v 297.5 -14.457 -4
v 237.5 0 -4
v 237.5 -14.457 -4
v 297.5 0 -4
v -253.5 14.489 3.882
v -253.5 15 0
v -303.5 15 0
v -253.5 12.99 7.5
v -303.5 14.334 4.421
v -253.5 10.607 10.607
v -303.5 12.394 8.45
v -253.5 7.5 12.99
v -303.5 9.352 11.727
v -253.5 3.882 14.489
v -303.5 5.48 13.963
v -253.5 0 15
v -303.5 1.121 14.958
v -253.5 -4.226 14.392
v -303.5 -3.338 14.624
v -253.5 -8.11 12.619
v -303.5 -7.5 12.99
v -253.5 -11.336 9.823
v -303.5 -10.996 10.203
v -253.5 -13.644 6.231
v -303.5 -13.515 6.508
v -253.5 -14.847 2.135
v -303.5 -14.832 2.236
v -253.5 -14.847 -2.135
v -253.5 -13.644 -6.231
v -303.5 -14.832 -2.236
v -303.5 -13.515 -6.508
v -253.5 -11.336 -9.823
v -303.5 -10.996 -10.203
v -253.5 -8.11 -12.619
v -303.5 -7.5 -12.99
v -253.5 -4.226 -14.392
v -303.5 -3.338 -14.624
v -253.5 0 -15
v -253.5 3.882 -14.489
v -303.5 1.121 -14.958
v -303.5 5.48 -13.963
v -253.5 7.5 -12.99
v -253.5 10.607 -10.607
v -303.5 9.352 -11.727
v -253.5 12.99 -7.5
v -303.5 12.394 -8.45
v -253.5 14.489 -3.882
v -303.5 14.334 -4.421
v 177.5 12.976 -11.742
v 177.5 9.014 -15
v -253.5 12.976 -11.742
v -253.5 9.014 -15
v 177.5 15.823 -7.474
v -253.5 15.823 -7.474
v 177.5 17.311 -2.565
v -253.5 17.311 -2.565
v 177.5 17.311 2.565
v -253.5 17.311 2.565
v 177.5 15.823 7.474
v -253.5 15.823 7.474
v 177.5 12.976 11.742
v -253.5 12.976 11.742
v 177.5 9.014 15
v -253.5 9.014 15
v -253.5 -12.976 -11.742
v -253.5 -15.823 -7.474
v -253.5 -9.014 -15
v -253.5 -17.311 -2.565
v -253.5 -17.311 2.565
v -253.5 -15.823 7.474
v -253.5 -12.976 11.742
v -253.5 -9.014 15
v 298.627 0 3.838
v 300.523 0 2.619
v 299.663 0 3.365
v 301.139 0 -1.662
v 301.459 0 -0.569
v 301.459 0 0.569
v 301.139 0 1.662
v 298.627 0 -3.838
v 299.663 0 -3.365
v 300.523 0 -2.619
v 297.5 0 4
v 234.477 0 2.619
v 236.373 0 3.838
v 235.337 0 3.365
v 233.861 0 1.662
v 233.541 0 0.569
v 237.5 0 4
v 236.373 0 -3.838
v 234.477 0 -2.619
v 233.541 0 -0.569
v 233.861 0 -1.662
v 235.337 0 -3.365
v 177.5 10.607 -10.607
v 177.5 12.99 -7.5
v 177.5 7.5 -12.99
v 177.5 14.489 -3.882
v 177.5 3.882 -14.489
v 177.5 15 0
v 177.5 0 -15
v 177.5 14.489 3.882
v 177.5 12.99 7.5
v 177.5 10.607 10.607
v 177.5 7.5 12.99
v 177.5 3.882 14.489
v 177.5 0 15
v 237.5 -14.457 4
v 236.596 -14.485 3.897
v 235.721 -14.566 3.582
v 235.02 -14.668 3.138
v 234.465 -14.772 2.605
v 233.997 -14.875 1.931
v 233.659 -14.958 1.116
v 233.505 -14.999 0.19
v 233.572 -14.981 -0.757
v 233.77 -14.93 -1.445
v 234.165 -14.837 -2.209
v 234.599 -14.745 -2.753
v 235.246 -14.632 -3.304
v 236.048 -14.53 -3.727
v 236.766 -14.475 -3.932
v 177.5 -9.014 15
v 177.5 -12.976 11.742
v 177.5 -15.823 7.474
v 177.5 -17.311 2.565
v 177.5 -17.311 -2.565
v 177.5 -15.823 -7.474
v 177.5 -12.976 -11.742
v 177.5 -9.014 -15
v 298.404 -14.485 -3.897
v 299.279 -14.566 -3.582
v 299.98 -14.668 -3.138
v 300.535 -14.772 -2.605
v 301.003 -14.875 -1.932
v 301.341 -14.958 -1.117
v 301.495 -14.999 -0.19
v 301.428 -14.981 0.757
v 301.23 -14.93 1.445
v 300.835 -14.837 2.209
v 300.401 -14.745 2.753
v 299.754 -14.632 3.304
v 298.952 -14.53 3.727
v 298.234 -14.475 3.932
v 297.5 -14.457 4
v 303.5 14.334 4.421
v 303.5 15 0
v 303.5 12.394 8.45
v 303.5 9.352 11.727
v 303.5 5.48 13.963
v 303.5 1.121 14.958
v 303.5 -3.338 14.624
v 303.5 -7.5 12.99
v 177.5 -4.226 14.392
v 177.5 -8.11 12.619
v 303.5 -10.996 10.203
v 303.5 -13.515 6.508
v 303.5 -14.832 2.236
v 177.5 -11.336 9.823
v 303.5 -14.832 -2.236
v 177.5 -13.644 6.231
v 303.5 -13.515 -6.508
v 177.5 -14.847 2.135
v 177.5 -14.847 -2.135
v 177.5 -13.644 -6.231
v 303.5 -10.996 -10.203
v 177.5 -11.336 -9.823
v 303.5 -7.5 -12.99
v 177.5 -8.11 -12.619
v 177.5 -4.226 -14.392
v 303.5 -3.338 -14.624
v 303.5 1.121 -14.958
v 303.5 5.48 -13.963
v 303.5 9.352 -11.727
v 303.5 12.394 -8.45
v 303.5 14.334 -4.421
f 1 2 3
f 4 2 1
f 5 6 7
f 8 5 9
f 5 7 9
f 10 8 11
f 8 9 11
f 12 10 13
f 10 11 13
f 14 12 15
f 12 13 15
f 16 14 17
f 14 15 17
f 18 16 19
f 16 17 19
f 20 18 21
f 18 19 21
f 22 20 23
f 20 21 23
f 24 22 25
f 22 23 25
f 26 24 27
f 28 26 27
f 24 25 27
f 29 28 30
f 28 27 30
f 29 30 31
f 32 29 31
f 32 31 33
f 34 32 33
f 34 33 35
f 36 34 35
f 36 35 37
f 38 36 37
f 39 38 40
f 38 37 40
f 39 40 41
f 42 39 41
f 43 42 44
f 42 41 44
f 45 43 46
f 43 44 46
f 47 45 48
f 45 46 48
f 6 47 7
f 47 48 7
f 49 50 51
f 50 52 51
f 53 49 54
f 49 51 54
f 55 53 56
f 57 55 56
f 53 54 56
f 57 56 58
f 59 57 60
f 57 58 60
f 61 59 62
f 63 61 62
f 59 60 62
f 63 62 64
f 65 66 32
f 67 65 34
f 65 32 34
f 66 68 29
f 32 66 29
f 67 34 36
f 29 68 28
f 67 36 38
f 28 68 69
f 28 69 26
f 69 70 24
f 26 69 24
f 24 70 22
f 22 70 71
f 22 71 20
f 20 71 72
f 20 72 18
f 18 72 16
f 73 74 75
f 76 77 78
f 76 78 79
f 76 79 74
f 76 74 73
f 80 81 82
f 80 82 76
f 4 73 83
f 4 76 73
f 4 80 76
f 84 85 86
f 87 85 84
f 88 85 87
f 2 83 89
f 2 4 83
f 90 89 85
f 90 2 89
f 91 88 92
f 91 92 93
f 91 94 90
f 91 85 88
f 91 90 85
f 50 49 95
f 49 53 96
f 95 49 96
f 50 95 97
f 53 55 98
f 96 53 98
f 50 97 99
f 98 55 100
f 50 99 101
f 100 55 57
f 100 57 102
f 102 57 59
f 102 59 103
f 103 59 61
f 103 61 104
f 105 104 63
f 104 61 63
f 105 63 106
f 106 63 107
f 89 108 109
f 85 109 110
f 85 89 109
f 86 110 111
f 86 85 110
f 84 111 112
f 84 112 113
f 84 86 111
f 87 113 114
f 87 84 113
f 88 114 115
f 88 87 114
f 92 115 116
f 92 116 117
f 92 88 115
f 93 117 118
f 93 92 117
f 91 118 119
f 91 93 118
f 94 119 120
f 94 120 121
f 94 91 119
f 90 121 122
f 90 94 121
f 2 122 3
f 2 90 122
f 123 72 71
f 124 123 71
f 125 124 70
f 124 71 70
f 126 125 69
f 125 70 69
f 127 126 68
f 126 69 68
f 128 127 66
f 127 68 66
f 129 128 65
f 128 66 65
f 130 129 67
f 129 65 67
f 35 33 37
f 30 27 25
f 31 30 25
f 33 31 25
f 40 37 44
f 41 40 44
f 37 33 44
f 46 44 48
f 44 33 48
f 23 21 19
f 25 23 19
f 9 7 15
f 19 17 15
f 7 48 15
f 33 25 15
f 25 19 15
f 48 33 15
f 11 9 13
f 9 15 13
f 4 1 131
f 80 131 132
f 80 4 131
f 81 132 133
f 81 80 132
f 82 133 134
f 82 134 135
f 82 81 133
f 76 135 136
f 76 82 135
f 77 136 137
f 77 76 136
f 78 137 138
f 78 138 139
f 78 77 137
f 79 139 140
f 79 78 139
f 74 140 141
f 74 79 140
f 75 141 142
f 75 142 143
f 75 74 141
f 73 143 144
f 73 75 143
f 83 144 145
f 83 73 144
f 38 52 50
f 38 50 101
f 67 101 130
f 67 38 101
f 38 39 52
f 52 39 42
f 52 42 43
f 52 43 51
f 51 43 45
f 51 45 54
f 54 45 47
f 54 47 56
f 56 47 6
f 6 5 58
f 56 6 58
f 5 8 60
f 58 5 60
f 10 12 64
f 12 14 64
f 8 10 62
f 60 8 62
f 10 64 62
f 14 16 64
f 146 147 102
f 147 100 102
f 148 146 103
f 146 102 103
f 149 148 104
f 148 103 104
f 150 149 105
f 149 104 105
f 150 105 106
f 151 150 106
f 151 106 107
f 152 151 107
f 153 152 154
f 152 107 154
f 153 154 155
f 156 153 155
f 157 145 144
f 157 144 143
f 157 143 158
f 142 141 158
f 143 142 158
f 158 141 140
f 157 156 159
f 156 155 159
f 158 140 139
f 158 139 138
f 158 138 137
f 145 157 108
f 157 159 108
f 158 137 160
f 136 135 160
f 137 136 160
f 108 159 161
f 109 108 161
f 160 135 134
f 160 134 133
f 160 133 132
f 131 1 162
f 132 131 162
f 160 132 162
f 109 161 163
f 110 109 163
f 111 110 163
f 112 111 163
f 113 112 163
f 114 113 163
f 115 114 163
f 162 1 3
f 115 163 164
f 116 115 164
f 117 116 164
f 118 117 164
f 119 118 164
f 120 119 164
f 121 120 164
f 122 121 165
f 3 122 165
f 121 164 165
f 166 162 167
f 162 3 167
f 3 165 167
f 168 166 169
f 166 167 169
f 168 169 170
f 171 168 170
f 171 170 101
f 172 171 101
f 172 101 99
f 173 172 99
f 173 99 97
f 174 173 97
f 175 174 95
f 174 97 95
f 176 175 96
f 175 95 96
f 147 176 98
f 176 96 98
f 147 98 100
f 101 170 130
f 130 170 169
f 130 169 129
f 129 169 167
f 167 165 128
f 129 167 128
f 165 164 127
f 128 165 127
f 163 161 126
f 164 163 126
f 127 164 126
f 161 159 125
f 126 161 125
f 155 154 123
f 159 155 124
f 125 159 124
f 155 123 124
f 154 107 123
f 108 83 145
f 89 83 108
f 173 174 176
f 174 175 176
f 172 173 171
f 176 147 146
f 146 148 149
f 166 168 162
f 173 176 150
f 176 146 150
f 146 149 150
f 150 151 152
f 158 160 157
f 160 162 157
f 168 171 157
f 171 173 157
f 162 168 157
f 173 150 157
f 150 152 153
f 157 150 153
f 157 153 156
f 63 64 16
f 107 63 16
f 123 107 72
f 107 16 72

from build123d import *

# Parameters (mm, degrees)
KES_EKSTR_ZYON1_DEPTH = 431
KES_EKSTR_ZYON2_DEPTH = 24


with BuildPart() as part:
    # Çizim1 → Döndür1 (revolve)
    with BuildSketch(Plane.XY):
        Polygon((-303.5, 0), (303.5, 0), (303.5, 15), (177.5, 15), (177.5, 17.5), (-253.5, 17.5), (-253.5, 15), (-303.5, 15), align=None)
    revolve(axis=Axis((-303.5, 0, 0), (1, 0, 0)))

    # Çizim2 → Kes-Ekstrüzyon1 (cut)
    with BuildSketch(Plane.ZY.offset(253.5)):
        with BuildLine():
            Line((-15, 9.013878189), (-15, -9.013878189))
            ThreePointArc((-15, -9.013878189), (-17.5, 0), (-15, 9.013878189))
        make_face()
        with BuildLine():
            Line((15, 9.013878189), (15, -9.013878189))
            ThreePointArc((15, -9.013878189), (17.5, 0), (15, 9.013878189))
        make_face()
    extrude(amount=-KES_EKSTR_ZYON1_DEPTH, mode=Mode.SUBTRACT)

    # Çizim3 → Kes-Ekstrüzyon2 (cut)
    with BuildSketch(Plane(origin=(0, 0, 0), x_dir=(1, 0, 0), z_dir=(0, 1, 0))):
        with BuildLine():
            Line((297.5, -4), (237.5, -4))
            ThreePointArc((237.5, -4), (233.5, 0), (237.5, 4))
            Line((237.5, 4), (297.5, 4))
            ThreePointArc((297.5, 4), (301.5, 0), (297.5, -4))
        make_face()
    extrude(amount=-KES_EKSTR_ZYON2_DEPTH, mode=Mode.SUBTRACT)


solid = part.part
